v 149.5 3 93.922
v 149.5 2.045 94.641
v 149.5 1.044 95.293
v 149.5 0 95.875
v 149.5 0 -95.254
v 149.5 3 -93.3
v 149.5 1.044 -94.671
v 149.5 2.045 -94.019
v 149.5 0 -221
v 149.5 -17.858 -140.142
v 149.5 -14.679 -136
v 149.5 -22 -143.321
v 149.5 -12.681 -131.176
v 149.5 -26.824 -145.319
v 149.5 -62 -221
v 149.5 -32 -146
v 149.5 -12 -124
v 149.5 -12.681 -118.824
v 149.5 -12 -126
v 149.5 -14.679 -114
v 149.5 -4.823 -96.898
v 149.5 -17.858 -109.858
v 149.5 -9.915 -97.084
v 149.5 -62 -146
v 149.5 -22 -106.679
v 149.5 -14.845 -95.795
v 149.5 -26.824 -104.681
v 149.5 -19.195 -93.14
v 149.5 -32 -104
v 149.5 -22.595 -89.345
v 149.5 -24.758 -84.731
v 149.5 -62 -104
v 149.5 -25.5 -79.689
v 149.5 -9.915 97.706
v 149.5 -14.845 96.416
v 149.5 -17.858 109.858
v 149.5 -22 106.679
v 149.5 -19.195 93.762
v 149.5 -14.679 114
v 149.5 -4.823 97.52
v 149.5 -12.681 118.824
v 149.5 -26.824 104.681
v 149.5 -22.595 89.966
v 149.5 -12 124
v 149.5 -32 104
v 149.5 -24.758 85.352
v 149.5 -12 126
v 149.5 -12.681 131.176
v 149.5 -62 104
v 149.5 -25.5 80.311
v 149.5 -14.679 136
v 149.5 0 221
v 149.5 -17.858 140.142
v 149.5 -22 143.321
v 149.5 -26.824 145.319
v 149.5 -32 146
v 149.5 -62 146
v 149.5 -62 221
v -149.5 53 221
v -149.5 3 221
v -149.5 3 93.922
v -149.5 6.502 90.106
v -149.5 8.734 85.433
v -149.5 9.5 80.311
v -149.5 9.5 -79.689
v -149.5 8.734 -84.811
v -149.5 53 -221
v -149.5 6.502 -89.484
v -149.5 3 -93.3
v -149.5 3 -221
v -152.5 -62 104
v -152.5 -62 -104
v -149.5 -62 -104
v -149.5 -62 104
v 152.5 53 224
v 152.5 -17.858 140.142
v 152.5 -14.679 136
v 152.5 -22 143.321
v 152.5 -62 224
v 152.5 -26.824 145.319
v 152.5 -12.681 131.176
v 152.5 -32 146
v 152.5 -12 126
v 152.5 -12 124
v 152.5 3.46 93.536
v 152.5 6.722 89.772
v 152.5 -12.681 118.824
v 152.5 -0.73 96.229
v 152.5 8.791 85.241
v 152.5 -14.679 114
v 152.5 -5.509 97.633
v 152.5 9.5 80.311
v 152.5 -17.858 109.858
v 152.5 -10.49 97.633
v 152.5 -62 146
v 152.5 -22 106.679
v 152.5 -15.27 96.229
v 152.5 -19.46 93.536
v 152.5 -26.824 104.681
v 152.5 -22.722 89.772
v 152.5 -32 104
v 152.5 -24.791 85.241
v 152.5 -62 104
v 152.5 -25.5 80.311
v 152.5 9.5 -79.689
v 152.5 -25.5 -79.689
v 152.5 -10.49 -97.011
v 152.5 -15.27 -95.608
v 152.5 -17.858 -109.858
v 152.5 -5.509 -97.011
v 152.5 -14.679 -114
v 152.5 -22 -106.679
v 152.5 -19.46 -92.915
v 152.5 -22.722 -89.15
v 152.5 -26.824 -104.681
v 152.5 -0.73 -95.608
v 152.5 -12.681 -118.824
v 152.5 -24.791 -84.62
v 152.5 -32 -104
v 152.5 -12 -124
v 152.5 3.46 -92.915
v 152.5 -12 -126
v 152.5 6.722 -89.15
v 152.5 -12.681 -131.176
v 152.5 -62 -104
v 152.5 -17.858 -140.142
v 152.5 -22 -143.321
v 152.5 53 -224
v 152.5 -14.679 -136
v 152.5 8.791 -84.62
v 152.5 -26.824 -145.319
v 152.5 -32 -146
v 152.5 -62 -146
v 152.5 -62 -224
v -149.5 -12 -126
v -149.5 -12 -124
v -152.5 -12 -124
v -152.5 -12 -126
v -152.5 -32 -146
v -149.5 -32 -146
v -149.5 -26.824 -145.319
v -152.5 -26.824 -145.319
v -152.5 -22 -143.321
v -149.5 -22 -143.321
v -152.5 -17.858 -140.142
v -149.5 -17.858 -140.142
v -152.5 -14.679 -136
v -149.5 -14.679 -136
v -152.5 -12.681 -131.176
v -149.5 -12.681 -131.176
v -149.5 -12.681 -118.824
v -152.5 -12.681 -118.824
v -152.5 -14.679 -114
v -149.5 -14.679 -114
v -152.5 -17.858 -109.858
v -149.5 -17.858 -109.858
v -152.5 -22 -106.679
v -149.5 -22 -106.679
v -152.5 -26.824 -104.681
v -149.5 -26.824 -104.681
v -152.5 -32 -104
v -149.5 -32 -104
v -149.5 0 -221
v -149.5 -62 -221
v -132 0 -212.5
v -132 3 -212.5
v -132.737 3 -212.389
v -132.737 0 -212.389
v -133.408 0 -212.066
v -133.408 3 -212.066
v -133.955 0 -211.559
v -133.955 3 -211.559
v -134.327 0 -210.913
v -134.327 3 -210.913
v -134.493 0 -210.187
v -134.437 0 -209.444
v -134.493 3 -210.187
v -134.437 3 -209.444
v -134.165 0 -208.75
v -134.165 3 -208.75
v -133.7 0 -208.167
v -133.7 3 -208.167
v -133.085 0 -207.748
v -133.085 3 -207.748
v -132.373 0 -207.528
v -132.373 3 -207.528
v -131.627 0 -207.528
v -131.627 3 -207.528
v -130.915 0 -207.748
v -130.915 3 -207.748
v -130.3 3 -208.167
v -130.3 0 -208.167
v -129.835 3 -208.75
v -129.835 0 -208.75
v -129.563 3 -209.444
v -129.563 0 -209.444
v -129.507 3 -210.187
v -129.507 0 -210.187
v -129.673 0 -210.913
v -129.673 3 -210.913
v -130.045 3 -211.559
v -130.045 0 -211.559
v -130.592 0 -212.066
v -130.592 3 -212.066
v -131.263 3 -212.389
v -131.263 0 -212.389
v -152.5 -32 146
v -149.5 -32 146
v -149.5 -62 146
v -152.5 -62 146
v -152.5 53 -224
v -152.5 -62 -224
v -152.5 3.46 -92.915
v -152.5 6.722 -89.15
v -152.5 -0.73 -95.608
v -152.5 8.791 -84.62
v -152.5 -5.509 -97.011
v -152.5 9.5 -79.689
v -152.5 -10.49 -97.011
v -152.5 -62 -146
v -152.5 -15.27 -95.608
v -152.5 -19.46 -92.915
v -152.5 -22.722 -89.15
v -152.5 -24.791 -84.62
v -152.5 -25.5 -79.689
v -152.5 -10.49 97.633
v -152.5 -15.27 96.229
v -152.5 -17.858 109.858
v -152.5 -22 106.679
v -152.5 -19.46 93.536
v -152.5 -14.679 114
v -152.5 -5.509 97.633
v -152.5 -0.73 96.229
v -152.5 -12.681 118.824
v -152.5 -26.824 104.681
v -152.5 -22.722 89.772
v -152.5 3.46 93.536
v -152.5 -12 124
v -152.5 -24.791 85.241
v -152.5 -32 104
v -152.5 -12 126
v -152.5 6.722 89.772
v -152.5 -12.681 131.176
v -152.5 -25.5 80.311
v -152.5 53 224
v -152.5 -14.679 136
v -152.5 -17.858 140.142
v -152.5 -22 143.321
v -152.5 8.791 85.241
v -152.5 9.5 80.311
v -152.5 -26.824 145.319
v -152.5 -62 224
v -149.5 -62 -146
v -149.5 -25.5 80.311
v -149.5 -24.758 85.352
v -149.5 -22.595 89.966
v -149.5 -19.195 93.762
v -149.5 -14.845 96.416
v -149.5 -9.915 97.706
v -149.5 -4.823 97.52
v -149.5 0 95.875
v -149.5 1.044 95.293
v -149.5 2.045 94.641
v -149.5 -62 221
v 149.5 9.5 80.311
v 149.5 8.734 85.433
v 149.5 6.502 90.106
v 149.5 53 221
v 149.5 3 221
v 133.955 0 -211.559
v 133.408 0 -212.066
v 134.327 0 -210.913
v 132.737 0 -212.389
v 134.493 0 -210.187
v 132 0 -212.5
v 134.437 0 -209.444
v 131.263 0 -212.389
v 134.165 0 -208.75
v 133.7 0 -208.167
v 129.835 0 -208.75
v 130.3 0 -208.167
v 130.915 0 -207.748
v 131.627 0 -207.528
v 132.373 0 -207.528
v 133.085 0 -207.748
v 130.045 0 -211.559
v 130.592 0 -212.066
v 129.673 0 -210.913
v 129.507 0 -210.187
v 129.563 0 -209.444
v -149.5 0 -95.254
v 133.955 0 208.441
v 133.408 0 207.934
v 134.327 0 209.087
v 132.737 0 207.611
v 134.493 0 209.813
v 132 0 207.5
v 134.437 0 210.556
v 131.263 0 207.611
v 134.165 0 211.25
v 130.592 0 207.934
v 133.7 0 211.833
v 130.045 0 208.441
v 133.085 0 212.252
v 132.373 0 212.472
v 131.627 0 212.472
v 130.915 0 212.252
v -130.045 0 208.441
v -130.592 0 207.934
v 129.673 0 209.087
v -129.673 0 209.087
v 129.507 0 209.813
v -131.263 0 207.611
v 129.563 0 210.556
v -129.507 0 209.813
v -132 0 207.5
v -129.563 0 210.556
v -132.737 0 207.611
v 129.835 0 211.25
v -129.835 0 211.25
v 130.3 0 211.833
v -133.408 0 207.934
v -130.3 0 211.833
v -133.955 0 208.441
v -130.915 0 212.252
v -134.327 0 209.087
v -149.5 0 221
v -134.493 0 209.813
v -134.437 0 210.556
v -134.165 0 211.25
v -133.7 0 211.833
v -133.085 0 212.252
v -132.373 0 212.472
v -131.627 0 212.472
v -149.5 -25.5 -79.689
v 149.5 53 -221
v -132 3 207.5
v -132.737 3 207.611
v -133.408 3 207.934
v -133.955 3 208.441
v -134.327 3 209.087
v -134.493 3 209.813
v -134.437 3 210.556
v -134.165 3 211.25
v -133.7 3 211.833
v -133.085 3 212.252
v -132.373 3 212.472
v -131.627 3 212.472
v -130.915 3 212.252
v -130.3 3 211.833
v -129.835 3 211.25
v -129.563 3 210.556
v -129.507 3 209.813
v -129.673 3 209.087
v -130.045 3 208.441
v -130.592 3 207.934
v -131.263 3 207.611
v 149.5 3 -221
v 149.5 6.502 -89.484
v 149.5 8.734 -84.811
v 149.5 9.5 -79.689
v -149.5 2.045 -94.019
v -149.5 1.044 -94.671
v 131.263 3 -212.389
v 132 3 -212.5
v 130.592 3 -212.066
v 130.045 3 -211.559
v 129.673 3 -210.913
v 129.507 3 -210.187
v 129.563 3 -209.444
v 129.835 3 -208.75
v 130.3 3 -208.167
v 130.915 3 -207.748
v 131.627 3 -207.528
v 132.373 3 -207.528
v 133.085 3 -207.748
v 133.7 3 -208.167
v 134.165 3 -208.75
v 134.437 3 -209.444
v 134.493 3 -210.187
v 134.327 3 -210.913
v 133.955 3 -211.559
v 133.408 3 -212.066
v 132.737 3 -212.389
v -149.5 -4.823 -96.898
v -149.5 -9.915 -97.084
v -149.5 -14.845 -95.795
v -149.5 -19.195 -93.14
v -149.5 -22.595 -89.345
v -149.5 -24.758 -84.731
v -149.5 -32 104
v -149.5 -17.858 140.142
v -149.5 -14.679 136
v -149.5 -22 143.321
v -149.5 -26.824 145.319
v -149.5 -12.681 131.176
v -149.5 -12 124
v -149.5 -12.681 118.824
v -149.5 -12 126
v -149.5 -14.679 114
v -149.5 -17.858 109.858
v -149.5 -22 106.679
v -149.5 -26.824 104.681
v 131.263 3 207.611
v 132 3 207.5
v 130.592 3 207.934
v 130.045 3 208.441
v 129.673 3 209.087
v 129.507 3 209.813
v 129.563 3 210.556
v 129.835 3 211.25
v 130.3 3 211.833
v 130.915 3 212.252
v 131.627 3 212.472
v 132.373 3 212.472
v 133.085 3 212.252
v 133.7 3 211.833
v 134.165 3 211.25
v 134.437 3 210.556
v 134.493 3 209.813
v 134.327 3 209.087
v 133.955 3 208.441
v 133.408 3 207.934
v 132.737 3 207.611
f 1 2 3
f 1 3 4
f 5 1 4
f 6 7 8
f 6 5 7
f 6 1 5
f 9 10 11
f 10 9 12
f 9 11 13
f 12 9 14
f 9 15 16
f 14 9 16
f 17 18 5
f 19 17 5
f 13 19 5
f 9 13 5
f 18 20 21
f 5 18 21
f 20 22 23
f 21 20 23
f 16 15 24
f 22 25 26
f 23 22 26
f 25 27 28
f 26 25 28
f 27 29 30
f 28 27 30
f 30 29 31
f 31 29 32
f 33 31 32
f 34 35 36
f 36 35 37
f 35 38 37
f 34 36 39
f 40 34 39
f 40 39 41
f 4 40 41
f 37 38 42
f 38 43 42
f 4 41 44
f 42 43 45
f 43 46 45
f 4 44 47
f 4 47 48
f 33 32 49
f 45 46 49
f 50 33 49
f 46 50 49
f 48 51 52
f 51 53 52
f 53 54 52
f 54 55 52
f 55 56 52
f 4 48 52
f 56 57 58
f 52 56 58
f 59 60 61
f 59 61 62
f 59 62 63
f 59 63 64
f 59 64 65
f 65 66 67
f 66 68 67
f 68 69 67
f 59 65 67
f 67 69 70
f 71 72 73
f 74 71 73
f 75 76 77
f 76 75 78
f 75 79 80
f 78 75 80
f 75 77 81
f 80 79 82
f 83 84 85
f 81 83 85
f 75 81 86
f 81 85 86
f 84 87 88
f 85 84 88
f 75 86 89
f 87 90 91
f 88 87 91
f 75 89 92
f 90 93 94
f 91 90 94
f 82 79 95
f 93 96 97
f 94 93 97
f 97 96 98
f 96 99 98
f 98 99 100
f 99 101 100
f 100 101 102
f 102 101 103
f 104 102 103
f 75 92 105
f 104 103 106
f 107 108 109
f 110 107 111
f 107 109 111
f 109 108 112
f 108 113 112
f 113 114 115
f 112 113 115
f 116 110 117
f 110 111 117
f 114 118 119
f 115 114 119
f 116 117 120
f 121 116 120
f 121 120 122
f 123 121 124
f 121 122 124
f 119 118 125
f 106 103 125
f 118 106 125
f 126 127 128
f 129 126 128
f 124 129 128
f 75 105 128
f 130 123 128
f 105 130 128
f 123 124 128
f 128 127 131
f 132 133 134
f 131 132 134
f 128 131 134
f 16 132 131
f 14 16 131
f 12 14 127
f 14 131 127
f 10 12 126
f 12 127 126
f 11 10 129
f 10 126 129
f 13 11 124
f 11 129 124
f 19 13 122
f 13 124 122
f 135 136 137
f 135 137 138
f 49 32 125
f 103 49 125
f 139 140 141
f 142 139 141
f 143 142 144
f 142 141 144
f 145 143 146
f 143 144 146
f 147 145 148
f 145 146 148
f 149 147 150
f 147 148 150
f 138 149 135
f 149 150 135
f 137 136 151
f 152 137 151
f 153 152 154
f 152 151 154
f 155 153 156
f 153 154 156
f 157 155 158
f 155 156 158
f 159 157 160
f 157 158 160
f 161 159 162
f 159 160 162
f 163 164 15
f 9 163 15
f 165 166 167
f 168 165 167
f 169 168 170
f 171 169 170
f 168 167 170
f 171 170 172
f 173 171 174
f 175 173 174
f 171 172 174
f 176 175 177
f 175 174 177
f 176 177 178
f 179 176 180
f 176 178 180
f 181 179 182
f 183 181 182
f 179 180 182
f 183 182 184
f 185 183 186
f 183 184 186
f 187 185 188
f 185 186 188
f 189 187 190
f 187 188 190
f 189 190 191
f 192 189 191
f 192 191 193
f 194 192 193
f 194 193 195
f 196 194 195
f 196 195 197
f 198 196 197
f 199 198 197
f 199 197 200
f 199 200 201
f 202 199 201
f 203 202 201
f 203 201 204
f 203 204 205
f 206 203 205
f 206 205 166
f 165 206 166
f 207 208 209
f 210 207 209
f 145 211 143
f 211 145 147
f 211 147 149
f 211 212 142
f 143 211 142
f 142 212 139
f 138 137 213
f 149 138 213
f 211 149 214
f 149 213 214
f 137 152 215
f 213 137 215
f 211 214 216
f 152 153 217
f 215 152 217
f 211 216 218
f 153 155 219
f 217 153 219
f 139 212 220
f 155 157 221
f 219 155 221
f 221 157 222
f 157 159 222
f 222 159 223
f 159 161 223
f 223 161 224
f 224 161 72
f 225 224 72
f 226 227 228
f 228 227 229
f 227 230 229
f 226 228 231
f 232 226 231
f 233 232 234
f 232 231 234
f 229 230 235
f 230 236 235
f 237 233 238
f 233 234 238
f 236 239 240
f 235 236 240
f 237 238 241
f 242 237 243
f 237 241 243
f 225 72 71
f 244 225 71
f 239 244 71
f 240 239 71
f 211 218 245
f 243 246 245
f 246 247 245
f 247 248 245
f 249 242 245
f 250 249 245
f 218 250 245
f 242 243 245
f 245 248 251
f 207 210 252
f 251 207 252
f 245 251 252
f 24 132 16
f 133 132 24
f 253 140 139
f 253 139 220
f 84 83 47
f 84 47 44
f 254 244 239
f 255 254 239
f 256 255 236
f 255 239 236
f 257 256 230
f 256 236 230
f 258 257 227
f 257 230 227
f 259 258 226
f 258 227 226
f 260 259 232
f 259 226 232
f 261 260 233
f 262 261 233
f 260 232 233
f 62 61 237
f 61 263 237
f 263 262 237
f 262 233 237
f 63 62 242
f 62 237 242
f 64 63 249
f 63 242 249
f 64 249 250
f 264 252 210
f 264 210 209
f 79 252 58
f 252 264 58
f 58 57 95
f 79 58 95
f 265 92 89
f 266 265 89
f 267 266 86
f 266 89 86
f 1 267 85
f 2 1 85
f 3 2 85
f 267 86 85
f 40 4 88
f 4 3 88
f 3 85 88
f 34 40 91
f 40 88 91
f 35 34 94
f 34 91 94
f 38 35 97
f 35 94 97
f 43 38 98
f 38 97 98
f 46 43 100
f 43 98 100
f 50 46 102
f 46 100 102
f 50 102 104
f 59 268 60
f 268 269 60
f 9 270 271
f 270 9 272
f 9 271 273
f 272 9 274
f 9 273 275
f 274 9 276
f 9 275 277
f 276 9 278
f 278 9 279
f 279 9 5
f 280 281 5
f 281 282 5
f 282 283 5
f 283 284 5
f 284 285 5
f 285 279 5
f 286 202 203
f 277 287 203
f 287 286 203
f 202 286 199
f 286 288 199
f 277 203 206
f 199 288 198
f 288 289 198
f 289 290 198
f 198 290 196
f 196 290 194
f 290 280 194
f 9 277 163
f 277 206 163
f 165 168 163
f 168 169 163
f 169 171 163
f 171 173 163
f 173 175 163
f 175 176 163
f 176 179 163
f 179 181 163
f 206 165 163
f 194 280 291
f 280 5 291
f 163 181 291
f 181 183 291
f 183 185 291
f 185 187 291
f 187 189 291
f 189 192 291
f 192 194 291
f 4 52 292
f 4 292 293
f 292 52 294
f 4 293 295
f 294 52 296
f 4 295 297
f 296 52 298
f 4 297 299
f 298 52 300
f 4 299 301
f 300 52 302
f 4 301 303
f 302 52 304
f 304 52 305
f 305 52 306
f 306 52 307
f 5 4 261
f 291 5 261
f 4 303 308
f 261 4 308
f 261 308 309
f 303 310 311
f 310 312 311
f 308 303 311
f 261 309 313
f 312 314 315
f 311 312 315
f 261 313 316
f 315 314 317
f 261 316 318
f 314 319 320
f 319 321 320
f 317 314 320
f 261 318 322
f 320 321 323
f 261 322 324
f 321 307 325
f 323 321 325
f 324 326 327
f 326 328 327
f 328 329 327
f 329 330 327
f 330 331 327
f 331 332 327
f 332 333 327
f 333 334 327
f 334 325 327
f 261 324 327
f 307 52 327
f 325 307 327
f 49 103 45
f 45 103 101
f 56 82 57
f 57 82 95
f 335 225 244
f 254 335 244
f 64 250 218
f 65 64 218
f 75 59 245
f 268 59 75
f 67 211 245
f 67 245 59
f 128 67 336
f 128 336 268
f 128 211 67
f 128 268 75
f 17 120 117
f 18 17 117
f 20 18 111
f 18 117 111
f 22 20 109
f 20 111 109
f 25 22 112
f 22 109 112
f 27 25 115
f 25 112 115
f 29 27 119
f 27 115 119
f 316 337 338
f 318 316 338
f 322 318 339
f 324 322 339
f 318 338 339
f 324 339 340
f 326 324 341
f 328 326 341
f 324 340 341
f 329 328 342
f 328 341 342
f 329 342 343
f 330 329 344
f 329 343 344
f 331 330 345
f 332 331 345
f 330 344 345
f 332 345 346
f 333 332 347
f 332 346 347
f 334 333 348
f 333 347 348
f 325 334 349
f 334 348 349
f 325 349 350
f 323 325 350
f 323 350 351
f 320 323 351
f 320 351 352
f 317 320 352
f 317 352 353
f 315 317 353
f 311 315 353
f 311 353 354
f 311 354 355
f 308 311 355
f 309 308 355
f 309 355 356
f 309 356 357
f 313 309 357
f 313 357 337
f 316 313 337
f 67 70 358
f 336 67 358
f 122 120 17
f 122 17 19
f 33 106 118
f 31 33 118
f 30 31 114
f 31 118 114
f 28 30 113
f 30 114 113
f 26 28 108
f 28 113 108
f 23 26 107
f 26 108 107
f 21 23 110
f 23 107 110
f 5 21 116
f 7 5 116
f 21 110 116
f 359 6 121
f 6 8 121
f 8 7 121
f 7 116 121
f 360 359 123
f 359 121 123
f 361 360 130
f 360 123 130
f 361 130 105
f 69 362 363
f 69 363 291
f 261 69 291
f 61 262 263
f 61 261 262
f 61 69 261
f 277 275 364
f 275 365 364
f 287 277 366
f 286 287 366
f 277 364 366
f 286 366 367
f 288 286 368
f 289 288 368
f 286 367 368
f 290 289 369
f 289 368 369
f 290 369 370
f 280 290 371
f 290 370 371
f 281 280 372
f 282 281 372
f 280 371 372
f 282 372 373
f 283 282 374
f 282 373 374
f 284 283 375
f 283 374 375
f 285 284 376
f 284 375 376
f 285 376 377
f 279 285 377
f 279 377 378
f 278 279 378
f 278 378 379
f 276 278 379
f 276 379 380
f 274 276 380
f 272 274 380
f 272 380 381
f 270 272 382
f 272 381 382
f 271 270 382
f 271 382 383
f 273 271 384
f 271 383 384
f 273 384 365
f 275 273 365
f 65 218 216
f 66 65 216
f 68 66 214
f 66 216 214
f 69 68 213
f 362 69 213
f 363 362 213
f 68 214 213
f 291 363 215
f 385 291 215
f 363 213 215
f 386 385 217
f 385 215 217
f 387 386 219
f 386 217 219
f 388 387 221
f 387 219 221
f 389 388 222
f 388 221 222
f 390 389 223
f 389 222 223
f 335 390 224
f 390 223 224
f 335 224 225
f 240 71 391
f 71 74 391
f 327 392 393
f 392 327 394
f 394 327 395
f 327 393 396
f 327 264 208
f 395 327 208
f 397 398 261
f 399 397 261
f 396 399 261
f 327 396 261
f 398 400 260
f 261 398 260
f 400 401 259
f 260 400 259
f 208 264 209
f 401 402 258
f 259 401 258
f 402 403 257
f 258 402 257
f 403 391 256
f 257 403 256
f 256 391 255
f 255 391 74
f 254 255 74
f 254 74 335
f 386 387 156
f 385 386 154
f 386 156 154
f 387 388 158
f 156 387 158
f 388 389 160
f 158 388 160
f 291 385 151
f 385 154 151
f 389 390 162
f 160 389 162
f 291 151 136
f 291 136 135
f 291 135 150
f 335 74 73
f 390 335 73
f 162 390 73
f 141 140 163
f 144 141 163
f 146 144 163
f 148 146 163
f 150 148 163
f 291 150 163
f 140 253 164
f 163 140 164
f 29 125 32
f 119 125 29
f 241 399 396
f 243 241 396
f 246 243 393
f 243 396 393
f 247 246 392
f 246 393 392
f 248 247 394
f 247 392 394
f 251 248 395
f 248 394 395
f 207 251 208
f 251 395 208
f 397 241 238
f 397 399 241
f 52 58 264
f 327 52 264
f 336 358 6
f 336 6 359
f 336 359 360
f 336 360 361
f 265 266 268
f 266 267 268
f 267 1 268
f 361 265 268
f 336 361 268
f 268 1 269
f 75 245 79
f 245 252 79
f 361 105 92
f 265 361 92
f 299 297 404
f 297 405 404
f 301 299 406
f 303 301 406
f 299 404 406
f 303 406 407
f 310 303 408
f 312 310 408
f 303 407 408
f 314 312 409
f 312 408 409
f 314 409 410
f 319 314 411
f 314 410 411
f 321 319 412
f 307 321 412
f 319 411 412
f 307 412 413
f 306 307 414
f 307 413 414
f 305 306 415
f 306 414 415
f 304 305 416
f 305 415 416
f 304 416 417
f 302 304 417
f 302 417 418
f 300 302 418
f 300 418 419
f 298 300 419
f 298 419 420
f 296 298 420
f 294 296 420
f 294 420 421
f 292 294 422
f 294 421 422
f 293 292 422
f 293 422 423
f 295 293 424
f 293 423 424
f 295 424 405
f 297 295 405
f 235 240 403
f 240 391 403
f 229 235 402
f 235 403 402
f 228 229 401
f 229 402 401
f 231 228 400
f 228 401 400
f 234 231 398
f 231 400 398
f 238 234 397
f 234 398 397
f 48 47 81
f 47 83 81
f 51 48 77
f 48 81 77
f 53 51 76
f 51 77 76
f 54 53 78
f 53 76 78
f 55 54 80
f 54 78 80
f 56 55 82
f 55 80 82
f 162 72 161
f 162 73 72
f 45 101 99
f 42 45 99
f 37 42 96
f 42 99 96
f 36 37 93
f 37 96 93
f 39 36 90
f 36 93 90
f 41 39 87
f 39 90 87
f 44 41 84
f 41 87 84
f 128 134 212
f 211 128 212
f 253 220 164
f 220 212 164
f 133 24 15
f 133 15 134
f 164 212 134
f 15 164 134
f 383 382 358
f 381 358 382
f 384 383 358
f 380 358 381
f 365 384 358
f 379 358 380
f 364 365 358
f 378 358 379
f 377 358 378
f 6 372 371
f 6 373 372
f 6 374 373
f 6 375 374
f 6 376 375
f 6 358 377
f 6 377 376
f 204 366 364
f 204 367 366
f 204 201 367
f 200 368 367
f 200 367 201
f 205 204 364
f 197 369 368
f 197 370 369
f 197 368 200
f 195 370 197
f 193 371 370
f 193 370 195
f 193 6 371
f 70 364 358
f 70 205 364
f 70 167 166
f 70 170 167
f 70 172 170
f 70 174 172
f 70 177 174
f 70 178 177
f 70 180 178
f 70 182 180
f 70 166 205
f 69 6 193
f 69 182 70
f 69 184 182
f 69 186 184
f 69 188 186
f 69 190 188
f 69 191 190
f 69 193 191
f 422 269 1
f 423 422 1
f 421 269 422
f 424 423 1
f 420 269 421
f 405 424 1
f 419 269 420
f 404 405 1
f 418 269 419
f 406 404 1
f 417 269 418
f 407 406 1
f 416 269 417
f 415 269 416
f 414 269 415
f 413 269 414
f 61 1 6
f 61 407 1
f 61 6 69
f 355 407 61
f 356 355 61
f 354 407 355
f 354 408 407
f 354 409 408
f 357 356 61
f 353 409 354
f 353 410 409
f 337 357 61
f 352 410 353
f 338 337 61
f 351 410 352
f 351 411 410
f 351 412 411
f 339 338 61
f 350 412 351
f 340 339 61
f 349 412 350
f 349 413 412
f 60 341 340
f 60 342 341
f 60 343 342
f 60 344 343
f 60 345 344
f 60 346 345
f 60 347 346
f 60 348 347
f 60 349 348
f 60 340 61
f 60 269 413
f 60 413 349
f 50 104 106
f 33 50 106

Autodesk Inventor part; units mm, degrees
ref_plane "YZ Plane" through (0, 0, 0) normal (1, 0, 0) x (0, 1, 0)
ref_plane "XZ Plane" through (0, 0, 0) normal (0, 1, 0) x (-1, 0, 0)
sketch "Sketch1" plane through (0, 0, 0) normal (0, 1, 0) x (-1, 0, 0)
  line L0 (-152.5, -224) -> (152.5, -224)
  line L1 (152.5, -224) -> (152.5, 224)
  line L2 (152.5, 224) -> (-152.5, 224)
  line L3 (-152.5, 224) -> (-152.5, -224)
  line L4 (-152.5, -224) -> (152.5, 224) construction
  line L5 (152.5, -224) -> (-152.5, 224) construction
  point P0 (0, 0)
  point P1 (132, 210)
  point P2 (-132, -210)
  point P3 (132, -210)
  point P4 (-132, 210)
  dimension "d0" = 305
  dimension "d1" = 448
extrude "Extrusion1" add sketch "Sketch1" along normal blind 3
sketch "Sketch2" plane through (0, 3, 0) normal (0, 1, 0) x (1, 0, 0)
  line L0 (-152.5, 224) -> (-152.5, -224) projected
  line L1 (-152.5, -224) -> (152.5, -224) projected
  line L2 (152.5, -224) -> (152.5, 224) projected
  line L3 (152.5, 224) -> (-152.5, 224) projected
  line L4 (-152.5, 224) -> (-152.5, -224) projected
  line L5 (-152.5, -224) -> (152.5, -224) projected
  line L6 (152.5, -224) -> (152.5, 224) projected
  line L7 (152.5, 224) -> (-152.5, 224) projected
  line L8 (-149.5, -221) -> (-149.5, 221)
  line L9 (-149.5, 221) -> (149.5, 221)
  line L10 (149.5, 221) -> (149.5, -221)
  line L11 (149.5, -221) -> (-149.5, -221)
  point P0 (0, 0)
  dimension "d4" = 3
extrude "Extrusion2" add sketch "Sketch2" along normal blind 50 and the other way blind 65
hole "Hole1" at (132, 0, -210) at (132, 0, 210) at (-132, 0, 210) at (-132, 0, -210) direction (0, 1, 0) diameter 5 end through all
sketch "Sketch3" plane through (152.5, -62, -224) normal (1, 0, 0) x (0, 0, -1)
  line L0 (0, 0) -> (0, 115) projected
  line L1 (-448, 115) -> (0, 115) projected
  line L2 (-448, 0) -> (-448, 115) projected
  line L3 (0, 0) -> (-448, 0) projected
  point P0 (-224, 62)
sketch "Sketch4" plane through (152.5, -62, -224) normal (1, 0, 0) x (0, 0, -1)
  line L0 (0, 0) -> (0, 115) projected
  line L1 (-448, 115) -> (0, 115) projected
  line L2 (-448, 0) -> (-448, 115) projected
  line L3 (0, 0) -> (-448, 0) projected
  point P0 (-224, 62)
sketch "Sketch5" plane through (152.5, -62, -224) normal (1, 0, 0) x (0, 0, -1)
  line L0 (0, 0) -> (0, 115) projected
  line L1 (-448, 115) -> (0, 115) projected
  line L2 (-448, 0) -> (-448, 115) projected
  line L3 (0, 0) -> (-448, 0) projected
  line L4 (0, 0) -> (-448, 0) projected
  point P0 (-224, 62)
  point P1 (-224, 62)
  point P2 (-99, 25)
  dimension "d16" = 99
  dimension "d17" = 25
sketch "Sketch6" plane through (152.5, -62, -224) normal (1, 0, 0) x (0, 0, -1)
  line L0 (0, 0) -> (-448, 0) projected
  line L1 (-445, 115) -> (-3, 115) projected
  line L2 (-224, 115) -> (-224, 0)
  line L3 (-78, 0) -> (-120, 0)
  line L4 (-120, 0) -> (-120, 30)
  line L5 (-100, 50) -> (-98, 50)
  line L6 (-78, 30) -> (-78, 0)
  line L7 (-78, 0) -> (-120, 50) construction
  line L8 (-120, 0) -> (-78, 50) construction
  line L9 (-448, 0) -> (-448, 115) projected
  arc A0 (-100, 50) -> (-120, 30) centre (-100, 30) ccw
  arc A1 (-78, 30) -> (-98, 50) centre (-98, 30) ccw
  line L10 (-328, 0) -> (-328, 30)
  line L11 (-370, 30) -> (-370, 0)
  line L12 (-370, 0) -> (-328, 50) construction
  line L13 (-328, 0) -> (-370, 50) construction
  arc A2 (-328, 30) -> (-348, 50) centre (-348, 30) ccw
  arc A3 (-350, 50) -> (-370, 30) centre (-350, 30) ccw
  line L14 (-304.3108, 54.0001) -> (-144.3108, 54.0001) construction
  line L15 (-445, 62) -> (-3, 62) projected
  line L16 (-304.3108, 36.5001) -> (-144.3108, 36.5001)
  line L17 (-144.3108, 71.5001) -> (-304.3108, 71.5001)
  arc A4 (-304.3108, 71.5001) -> (-304.3108, 36.5001) centre (-304.3108, 54.0001) ccw
  arc A5 (-144.3108, 36.5001) -> (-144.3108, 71.5001) centre (-144.3108, 54.0001) ccw
  line L18 (-370, 0) -> (-328, 0)
  line L19 (-328, 0) -> (-328, 30)
  line L20 (-328, 30) -> (-370, 30)
  line L21 (-370, 30) -> (-370, 0)
  line L22 (-350, 50) -> (-348, 50)
  point P0 (-224, 62)
  point P1 (-99, 25)
  point P2 (-99, 25)
  point P3 (-99, 25)
  point P4 (-120, 0)
  point P5 (-78, 0)
  point P6 (-349, 25)
  point P7 (-349, 25)
  point P8 (-99, 50)
  point P9 (-349, 50)
  point P10 (-370, 0)
  point P11 (-328, 0)
  point P12 (-224.3108, 54.0001)
  point P13 (-304.3108, 54.0001)
  dimension "d18" = 42
  dimension "d19" = 50
  dimension "d26" = 20
  dimension "d27" = 20
  dimension "d28" = 99
  dimension "d29" = 25
  dimension "d32" = 35
extrude "Extrusion3" cut sketch "Sketch6" against normal through all contours L0 L4 A0 L5 A1 L6
extrude "Extrusion4" cut sketch "Sketch6" against normal through all contours L0 L11 L20 L10 | L20 A3 L22 A2
extrude "Extrusion5" cut sketch "Sketch6" against normal blind 3 contours L16 A4 L15 L2 | L2 L15 A5 L16 | L15 A4 L17 L2 | L2 L17 A5 L15
sketch "Sketch7" plane through (152.5, -62, -224) normal (1, 0, 0) x (0, 0, -1)
  arc A0 (-144.3108, 36.5001) -> (-144.3108, 71.5001) centre (-144.3108, 54.0001) ccw projected
  line L0 (-144.3108, 36.5001) -> (-304.3108, 36.5001) projected
  arc A1 (-304.3108, 71.5001) -> (-304.3108, 36.5001) centre (-304.3108, 54.0001) ccw projected
  line L1 (-304.3108, 71.5001) -> (-144.3108, 71.5001) projected
  line L2 (-370, 0) -> (-370, 30) projected
  arc A2 (-328, 30) -> (-348, 50) centre (-348, 30) ccw projected
  line L3 (-328, 30) -> (-328, 0) projected
  line L4 (-120, 0) -> (-328, 0) projected
  line L5 (-120, 0) -> (-120, 30) projected
  arc A3 (-100, 50) -> (-120, 30) centre (-100, 30) ccw projected
  line L6 (-78, 30) -> (-78, 0) projected
  line L7 (0, 0) -> (-78, 0) projected
  line L8 (0, 0) -> (0, 115) projected
  line L9 (-448, 115) -> (0, 115) projected
  line L10 (-448, 0) -> (-448, 115) projected
  line L11 (-370, 0) -> (-448, 0) projected
  point P0 (-369, 30)
  point P1 (-79, 30)
  point P2 (-224, 62)
ref_plane "Work Plane2" through (0, -62, -224) normal (1, 0, 0) x (0, 0, -1)
sketch "Sketch8" plane through (152.5, -62, -224) normal (1, 0, 0) x (0, 0, -1)
  arc A0 (-144.3108, 36.5001) -> (-144.3108, 71.5001) centre (-144.3108, 54.0001) ccw projected
  line L0 (-144.3108, 36.5001) -> (-304.3108, 36.5001) projected
  arc A1 (-304.3108, 71.5001) -> (-304.3108, 36.5001) centre (-304.3108, 54.0001) ccw projected
  line L1 (-304.3108, 71.5001) -> (-144.3108, 71.5001) projected
  line L2 (-370, 0) -> (-370, 30) projected
  arc A2 (-328, 30) -> (-348, 50) centre (-348, 30) ccw projected
  line L3 (-328, 30) -> (-328, 0) projected
  line L4 (-120, 0) -> (-328, 0) projected
  line L5 (-120, 0) -> (-120, 30) projected
  arc A3 (-100, 50) -> (-120, 30) centre (-100, 30) ccw projected
  line L6 (-78, 30) -> (-78, 0) projected
  line L7 (0, 0) -> (-78, 0) projected
  line L8 (0, 0) -> (0, 115) projected
  line L9 (-448, 115) -> (0, 115) projected
  line L10 (-448, 0) -> (-448, 115) projected
  line L11 (-370, 0) -> (-448, 0) projected
  point P0 (-369, 30)
  point P1 (-79, 30)
  point P2 (-224, 62)
mirror "Mirror1" about plane through (0, -62, -224) normal (1, 0, 0) of "Extrusion5"
properties part number "AMR_Top_Basket" material "Aluminum 6061"
